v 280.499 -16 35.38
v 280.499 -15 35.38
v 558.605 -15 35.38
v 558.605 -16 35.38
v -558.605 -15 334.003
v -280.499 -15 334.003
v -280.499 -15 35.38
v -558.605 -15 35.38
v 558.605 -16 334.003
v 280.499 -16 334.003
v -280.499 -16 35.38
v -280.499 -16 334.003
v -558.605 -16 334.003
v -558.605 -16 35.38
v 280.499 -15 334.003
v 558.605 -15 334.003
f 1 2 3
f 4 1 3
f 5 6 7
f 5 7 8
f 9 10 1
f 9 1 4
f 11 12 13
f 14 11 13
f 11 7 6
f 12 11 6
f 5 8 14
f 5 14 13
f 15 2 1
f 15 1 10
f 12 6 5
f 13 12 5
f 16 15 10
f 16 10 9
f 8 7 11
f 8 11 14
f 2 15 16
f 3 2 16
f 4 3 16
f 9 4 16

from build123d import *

# Parameters (mm, degrees)
F1_W     = 278.1066
F1_H     = 298.62263
F2_DEPTH = 1


with BuildPart() as f2:
    # F1 (on offset) → F2 (new body)
    with BuildSketch(Plane.XZ.offset(15)):
        with Locations((419.552192, 184.691269)):
            Rectangle(F1_W, F1_H)
    extrude(amount=F2_DEPTH)


with BuildPart() as f3_1:
    # F3: instance of F2
    add(f2.part.mirror(Plane.YZ))


solid = Compound([f2.part, f3_1.part])
